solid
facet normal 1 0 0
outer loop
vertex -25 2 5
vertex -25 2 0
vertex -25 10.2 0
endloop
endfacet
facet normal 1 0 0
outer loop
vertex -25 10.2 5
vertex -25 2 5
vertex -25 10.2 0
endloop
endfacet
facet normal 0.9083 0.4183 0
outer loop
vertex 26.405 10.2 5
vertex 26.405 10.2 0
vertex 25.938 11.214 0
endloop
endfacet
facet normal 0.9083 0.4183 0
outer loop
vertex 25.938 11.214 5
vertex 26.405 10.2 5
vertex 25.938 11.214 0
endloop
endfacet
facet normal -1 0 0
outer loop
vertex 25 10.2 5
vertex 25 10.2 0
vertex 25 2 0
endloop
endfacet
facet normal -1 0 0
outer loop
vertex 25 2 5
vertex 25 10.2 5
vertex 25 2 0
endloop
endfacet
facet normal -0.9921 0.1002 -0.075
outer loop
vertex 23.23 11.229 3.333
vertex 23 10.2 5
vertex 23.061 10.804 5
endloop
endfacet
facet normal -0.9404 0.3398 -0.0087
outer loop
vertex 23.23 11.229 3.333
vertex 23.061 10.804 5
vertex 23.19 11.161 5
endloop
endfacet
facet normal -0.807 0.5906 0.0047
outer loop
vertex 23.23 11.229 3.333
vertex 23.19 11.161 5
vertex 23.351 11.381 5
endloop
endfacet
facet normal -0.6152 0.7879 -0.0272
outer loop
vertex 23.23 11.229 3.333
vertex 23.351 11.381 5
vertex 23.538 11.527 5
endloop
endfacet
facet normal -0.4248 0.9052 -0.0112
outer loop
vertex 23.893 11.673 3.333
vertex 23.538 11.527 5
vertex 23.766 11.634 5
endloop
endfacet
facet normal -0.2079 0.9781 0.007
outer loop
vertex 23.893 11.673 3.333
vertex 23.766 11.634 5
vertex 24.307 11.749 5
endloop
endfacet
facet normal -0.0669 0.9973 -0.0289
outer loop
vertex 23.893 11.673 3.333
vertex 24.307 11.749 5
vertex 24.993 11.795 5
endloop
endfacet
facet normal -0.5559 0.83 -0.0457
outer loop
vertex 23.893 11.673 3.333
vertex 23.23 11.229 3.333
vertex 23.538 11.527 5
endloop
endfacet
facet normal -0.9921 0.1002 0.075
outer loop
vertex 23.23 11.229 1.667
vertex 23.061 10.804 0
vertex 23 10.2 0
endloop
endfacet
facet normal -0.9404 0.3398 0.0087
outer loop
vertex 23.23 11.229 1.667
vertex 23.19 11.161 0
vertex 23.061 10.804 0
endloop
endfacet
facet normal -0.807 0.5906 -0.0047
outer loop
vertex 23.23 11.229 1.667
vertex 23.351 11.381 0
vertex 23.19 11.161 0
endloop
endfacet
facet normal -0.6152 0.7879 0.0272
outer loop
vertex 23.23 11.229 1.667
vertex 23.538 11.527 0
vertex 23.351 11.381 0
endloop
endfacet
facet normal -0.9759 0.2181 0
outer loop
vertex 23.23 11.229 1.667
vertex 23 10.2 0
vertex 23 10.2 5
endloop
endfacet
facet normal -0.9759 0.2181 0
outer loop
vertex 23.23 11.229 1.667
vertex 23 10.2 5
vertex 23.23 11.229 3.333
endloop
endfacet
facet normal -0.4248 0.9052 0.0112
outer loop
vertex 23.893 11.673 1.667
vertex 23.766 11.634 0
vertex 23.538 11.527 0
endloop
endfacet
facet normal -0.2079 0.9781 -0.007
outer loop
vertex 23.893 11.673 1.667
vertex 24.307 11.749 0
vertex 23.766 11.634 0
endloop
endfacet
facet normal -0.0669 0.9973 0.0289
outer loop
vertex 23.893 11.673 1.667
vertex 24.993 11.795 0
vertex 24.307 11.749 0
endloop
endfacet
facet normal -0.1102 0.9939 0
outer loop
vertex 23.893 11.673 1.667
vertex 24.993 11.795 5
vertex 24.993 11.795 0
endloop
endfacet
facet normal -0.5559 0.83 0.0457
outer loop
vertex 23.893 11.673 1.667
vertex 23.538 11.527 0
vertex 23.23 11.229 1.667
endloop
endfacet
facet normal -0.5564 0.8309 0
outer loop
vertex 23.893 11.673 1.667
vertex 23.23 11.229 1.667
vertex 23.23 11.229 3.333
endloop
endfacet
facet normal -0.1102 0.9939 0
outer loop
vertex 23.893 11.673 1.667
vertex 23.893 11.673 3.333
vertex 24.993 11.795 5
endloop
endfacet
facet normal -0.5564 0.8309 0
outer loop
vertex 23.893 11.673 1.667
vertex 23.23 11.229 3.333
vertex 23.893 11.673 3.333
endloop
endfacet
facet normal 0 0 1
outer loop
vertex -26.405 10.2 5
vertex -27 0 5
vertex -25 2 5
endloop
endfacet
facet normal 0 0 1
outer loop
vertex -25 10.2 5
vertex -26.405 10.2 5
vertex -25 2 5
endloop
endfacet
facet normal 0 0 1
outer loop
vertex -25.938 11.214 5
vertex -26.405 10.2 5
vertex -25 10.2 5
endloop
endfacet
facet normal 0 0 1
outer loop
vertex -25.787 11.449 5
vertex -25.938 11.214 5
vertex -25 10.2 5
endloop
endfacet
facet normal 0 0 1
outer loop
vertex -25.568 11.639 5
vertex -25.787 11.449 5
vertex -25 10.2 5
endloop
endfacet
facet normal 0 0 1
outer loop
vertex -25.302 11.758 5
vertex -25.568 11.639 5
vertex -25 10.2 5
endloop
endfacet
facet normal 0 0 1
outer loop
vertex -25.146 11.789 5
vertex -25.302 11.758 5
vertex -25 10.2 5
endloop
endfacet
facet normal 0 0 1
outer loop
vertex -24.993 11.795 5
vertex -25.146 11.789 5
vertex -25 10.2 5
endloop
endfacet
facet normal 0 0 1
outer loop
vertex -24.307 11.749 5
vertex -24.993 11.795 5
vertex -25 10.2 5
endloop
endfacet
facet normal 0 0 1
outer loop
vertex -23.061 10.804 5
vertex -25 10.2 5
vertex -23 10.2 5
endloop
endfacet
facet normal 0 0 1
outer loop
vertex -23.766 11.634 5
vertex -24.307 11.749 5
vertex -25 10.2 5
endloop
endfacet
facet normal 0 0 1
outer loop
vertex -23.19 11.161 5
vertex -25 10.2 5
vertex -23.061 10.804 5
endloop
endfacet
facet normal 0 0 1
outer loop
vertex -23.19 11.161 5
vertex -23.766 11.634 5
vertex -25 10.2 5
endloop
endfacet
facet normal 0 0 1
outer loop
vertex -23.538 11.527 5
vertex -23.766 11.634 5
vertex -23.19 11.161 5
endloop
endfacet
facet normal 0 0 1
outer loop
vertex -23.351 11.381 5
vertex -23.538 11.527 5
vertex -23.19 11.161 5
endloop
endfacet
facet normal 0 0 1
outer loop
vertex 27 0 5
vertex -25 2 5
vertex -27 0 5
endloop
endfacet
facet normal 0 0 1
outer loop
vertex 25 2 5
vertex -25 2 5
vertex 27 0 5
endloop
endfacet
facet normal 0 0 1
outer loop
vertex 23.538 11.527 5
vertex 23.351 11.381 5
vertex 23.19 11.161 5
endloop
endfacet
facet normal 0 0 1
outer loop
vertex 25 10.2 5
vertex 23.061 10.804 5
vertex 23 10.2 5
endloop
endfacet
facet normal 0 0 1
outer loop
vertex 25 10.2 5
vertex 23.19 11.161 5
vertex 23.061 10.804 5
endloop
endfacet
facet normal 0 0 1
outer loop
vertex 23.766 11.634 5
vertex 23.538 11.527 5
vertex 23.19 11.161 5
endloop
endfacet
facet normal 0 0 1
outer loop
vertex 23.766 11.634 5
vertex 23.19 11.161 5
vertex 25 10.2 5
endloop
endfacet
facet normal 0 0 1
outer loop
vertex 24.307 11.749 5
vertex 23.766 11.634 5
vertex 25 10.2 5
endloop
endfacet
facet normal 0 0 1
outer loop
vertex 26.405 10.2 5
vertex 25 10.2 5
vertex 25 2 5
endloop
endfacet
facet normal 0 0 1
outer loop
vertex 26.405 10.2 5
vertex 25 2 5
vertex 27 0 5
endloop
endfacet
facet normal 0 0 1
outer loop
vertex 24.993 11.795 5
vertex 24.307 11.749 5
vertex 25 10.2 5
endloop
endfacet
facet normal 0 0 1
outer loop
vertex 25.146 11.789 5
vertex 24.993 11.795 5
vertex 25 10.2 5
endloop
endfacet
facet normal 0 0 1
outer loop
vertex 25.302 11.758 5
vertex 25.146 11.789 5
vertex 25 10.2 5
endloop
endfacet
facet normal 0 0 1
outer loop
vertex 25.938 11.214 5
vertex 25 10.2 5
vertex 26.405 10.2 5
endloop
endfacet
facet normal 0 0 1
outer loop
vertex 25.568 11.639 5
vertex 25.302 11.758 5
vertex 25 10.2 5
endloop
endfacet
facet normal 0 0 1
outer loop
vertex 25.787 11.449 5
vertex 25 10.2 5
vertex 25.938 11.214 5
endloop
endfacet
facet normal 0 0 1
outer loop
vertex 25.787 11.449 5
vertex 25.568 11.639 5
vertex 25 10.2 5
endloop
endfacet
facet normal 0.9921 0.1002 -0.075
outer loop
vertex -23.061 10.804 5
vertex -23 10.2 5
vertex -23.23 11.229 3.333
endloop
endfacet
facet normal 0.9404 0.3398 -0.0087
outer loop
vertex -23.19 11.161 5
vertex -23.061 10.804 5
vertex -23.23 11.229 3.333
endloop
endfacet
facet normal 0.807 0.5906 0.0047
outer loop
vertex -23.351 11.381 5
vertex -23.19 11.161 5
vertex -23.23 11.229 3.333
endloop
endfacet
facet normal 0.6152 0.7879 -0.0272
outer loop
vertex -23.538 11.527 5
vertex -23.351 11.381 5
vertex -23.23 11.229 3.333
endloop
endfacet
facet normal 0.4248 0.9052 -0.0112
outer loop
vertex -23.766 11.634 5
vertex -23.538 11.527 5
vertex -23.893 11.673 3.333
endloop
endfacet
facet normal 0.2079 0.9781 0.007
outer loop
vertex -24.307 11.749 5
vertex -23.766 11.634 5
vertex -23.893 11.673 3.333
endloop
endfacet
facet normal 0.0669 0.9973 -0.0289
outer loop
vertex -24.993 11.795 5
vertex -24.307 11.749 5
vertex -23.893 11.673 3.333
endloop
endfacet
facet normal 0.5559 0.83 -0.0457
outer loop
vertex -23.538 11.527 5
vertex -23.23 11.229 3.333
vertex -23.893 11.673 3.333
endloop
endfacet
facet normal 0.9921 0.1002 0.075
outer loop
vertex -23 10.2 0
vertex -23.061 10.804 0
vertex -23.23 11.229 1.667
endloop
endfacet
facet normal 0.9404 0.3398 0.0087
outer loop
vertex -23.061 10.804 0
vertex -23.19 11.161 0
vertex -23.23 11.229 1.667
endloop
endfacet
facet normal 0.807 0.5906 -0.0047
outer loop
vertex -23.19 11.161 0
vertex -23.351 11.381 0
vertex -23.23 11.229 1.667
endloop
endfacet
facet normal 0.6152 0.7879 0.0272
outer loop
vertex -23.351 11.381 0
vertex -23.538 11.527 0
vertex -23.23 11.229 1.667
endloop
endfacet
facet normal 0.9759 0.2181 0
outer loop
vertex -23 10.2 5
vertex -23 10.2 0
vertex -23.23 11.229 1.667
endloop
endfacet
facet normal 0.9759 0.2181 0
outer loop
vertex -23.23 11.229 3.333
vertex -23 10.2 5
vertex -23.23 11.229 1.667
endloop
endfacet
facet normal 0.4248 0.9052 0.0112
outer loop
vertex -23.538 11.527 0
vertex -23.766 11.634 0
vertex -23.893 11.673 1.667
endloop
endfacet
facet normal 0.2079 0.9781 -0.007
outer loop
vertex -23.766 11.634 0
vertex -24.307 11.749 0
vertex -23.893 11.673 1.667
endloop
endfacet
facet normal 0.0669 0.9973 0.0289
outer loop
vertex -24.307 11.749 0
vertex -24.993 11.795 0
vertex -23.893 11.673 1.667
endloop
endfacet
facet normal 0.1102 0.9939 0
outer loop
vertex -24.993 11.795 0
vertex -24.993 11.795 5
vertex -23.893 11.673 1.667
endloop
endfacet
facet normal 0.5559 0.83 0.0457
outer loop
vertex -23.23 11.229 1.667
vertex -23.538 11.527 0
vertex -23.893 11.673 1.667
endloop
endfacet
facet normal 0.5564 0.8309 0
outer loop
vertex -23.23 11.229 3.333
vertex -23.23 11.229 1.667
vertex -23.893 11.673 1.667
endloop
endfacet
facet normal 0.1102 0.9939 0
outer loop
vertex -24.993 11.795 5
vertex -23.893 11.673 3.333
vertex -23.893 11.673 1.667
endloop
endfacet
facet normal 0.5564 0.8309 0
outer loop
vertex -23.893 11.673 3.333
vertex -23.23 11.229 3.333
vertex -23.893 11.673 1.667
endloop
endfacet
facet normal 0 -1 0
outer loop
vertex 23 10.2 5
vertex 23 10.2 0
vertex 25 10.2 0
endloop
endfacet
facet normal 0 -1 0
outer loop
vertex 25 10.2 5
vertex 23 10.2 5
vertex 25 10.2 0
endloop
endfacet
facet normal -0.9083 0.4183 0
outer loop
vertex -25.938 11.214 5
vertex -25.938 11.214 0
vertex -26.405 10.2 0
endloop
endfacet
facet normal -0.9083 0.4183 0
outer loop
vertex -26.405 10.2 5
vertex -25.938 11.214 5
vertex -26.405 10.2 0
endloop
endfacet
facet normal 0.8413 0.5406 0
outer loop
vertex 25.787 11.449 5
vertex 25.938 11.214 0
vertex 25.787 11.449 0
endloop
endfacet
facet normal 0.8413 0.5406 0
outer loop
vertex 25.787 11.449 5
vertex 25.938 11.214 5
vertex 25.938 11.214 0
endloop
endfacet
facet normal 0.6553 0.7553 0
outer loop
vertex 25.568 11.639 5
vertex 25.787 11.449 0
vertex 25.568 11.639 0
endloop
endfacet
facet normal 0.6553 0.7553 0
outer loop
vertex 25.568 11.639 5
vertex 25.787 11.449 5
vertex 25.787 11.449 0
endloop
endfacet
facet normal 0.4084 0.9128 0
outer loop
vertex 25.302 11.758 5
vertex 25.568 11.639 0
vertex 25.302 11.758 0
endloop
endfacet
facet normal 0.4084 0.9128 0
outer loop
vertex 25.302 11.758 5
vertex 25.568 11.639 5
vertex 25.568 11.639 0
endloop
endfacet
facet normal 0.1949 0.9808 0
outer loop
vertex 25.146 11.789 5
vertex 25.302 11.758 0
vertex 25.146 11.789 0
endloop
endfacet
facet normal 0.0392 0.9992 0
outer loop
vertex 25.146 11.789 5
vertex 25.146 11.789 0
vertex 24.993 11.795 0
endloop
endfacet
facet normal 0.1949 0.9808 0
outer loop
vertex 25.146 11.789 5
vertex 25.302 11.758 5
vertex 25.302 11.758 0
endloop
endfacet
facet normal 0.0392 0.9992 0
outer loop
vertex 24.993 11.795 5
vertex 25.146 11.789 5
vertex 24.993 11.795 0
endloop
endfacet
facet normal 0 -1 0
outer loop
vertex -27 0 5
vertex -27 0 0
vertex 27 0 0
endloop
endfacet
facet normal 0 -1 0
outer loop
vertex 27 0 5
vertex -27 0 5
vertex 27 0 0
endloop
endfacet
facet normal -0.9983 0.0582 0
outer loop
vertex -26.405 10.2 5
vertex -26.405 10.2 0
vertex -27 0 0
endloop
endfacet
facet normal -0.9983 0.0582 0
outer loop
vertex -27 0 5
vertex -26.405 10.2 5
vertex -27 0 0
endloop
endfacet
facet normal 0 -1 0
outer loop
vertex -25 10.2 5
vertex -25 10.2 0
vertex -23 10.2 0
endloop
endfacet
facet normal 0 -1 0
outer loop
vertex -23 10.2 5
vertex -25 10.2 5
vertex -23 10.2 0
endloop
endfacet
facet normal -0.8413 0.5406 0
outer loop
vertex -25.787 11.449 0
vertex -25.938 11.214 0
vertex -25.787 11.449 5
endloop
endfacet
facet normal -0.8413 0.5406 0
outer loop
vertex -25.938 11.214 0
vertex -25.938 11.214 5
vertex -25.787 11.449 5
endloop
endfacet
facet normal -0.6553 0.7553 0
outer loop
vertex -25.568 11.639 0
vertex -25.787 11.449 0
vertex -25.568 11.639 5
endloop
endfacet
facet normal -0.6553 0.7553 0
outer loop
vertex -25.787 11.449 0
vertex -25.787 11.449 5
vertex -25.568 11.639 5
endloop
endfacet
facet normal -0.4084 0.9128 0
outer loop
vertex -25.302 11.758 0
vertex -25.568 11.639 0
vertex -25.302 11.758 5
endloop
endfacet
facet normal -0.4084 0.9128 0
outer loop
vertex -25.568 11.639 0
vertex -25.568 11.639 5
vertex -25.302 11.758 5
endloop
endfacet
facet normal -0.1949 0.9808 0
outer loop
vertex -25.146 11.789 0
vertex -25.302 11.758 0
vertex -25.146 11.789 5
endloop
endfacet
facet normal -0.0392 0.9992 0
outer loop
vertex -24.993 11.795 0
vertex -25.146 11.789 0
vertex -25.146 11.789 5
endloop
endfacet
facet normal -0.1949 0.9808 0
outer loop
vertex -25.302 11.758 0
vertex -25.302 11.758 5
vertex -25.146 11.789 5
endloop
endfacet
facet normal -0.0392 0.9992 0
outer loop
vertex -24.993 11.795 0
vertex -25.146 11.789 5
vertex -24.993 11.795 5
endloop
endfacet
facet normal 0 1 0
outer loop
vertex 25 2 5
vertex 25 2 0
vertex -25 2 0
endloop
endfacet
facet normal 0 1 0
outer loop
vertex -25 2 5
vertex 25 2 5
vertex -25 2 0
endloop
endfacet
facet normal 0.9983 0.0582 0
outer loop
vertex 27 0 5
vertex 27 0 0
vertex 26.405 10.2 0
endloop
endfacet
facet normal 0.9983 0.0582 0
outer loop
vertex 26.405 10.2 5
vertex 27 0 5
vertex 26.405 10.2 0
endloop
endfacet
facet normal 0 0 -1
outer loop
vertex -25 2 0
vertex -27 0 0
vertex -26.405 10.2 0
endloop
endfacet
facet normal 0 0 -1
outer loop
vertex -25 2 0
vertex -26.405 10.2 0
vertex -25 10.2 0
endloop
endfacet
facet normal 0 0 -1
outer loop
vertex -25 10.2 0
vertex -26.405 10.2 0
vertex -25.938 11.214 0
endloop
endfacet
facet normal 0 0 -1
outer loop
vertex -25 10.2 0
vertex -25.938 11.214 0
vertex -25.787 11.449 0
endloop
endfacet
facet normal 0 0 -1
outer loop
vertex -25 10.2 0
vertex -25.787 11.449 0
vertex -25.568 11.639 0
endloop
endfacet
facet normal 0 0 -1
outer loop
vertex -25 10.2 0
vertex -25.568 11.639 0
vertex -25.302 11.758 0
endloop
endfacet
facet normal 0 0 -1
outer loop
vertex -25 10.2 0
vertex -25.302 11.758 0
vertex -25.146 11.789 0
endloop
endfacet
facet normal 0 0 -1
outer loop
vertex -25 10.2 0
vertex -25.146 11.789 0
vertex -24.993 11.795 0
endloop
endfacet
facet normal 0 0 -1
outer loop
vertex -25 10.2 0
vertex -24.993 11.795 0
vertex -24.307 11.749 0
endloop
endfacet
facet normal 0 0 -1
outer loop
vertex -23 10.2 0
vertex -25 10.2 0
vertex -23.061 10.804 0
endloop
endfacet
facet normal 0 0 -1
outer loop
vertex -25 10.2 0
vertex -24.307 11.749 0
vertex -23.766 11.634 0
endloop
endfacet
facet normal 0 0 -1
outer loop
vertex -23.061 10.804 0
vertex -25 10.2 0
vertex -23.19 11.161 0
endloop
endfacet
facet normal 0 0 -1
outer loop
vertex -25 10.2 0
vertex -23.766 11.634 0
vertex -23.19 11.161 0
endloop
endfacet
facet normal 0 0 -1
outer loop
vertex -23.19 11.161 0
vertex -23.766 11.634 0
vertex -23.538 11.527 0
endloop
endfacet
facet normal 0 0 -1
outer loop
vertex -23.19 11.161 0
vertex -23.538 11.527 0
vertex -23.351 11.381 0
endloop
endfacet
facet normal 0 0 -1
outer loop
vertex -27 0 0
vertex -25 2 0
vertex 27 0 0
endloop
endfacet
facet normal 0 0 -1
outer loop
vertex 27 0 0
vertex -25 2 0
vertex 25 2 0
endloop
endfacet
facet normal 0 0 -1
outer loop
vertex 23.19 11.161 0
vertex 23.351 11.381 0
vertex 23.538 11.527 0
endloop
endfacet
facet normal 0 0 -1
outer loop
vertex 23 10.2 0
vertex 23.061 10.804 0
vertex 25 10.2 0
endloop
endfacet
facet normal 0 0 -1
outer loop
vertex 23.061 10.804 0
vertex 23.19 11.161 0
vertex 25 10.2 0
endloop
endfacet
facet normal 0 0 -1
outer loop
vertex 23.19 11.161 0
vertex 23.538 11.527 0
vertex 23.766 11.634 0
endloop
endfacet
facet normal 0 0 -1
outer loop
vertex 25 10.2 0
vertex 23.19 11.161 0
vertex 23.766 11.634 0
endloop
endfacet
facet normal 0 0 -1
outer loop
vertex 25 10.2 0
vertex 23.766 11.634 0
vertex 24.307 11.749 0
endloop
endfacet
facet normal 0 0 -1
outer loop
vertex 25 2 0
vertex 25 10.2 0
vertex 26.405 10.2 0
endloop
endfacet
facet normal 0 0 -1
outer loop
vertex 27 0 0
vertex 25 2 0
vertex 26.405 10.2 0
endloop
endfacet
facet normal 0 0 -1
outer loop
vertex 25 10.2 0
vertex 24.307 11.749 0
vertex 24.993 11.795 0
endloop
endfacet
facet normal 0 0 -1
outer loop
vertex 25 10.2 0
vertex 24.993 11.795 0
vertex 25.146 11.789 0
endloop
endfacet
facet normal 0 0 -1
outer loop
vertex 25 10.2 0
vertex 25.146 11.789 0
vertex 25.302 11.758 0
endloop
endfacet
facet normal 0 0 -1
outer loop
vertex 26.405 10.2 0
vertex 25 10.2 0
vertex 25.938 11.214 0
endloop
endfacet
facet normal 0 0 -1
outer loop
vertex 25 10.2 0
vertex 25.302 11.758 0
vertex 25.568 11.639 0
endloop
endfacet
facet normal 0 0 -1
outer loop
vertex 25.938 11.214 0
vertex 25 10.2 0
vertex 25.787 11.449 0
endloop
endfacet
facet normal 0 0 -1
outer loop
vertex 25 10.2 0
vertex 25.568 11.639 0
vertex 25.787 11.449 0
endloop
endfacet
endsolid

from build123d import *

# Parameters (mm, degrees)
F0_W     = 25
F0_H     = 2
F1_DEPTH = 5
F2_R     = 1
F3_R     = 1


with BuildPart() as f1:
    # F0 (on Top) → F1 (new body)
    with BuildSketch(Plane.XY):
        with BuildLine():
            Line((-26.404906, 10.2), (-25, 10.2))
            Line((-25, 10.2), (-23, 10.2))
            add(Edge.make_bspline(
                [(-23, 10.2), (-23.017775, 11.829905), (-23.894977, 11.75835), (-25.660651, 11.815999)],
                knots=[0, 0, 0, 0, 3.112959, 3.112959, 3.112959, 3.112959], degree=3))
            Line((-25.660651, 11.815999), (-26.404906, 10.2))
        make_face()
        Polygon((-27, 0), (-25, 0), (-25, 2), (-25, 10.2), (-26.404906, 10.2), align=None)
        with Locations((-12.5, 1)):
            Rectangle(F0_W, F0_H)
        with Locations((12.5, 1)):
            Rectangle(F0_W, F0_H)
        Polygon((25, 2), (25, 0), (27, 0), (26.404906, 10.2), (25, 10.2), align=None)
        with BuildLine():
            Line((23, 10.2), (25, 10.2))
            Line((25, 10.2), (26.404906, 10.2))
            Line((26.404906, 10.2), (25.660651, 11.815999))
            add(Edge.make_bspline(
                [(23, 10.2), (23.017775, 11.829905), (23.894977, 11.75835), (25.660651, 11.815999)],
                knots=[0, 0, 0, 0, 3.112959, 3.112959, 3.112959, 3.112959], degree=3))
        make_face()
    extrude(amount=F1_DEPTH)

    # F2
    f2_edges = [f1.edges().sort_by_distance(p)[0] for p in [
        (25.660651, 11.815999, 2.5),
    ]]
    fillet(f2_edges, radius=F2_R)

    # F3
    f3_edges = [f1.edges().sort_by_distance(p)[0] for p in [
        (-25.660651, 11.815999, 2.5),
    ]]
    fillet(f3_edges, radius=F3_R)


solid = f1.part
